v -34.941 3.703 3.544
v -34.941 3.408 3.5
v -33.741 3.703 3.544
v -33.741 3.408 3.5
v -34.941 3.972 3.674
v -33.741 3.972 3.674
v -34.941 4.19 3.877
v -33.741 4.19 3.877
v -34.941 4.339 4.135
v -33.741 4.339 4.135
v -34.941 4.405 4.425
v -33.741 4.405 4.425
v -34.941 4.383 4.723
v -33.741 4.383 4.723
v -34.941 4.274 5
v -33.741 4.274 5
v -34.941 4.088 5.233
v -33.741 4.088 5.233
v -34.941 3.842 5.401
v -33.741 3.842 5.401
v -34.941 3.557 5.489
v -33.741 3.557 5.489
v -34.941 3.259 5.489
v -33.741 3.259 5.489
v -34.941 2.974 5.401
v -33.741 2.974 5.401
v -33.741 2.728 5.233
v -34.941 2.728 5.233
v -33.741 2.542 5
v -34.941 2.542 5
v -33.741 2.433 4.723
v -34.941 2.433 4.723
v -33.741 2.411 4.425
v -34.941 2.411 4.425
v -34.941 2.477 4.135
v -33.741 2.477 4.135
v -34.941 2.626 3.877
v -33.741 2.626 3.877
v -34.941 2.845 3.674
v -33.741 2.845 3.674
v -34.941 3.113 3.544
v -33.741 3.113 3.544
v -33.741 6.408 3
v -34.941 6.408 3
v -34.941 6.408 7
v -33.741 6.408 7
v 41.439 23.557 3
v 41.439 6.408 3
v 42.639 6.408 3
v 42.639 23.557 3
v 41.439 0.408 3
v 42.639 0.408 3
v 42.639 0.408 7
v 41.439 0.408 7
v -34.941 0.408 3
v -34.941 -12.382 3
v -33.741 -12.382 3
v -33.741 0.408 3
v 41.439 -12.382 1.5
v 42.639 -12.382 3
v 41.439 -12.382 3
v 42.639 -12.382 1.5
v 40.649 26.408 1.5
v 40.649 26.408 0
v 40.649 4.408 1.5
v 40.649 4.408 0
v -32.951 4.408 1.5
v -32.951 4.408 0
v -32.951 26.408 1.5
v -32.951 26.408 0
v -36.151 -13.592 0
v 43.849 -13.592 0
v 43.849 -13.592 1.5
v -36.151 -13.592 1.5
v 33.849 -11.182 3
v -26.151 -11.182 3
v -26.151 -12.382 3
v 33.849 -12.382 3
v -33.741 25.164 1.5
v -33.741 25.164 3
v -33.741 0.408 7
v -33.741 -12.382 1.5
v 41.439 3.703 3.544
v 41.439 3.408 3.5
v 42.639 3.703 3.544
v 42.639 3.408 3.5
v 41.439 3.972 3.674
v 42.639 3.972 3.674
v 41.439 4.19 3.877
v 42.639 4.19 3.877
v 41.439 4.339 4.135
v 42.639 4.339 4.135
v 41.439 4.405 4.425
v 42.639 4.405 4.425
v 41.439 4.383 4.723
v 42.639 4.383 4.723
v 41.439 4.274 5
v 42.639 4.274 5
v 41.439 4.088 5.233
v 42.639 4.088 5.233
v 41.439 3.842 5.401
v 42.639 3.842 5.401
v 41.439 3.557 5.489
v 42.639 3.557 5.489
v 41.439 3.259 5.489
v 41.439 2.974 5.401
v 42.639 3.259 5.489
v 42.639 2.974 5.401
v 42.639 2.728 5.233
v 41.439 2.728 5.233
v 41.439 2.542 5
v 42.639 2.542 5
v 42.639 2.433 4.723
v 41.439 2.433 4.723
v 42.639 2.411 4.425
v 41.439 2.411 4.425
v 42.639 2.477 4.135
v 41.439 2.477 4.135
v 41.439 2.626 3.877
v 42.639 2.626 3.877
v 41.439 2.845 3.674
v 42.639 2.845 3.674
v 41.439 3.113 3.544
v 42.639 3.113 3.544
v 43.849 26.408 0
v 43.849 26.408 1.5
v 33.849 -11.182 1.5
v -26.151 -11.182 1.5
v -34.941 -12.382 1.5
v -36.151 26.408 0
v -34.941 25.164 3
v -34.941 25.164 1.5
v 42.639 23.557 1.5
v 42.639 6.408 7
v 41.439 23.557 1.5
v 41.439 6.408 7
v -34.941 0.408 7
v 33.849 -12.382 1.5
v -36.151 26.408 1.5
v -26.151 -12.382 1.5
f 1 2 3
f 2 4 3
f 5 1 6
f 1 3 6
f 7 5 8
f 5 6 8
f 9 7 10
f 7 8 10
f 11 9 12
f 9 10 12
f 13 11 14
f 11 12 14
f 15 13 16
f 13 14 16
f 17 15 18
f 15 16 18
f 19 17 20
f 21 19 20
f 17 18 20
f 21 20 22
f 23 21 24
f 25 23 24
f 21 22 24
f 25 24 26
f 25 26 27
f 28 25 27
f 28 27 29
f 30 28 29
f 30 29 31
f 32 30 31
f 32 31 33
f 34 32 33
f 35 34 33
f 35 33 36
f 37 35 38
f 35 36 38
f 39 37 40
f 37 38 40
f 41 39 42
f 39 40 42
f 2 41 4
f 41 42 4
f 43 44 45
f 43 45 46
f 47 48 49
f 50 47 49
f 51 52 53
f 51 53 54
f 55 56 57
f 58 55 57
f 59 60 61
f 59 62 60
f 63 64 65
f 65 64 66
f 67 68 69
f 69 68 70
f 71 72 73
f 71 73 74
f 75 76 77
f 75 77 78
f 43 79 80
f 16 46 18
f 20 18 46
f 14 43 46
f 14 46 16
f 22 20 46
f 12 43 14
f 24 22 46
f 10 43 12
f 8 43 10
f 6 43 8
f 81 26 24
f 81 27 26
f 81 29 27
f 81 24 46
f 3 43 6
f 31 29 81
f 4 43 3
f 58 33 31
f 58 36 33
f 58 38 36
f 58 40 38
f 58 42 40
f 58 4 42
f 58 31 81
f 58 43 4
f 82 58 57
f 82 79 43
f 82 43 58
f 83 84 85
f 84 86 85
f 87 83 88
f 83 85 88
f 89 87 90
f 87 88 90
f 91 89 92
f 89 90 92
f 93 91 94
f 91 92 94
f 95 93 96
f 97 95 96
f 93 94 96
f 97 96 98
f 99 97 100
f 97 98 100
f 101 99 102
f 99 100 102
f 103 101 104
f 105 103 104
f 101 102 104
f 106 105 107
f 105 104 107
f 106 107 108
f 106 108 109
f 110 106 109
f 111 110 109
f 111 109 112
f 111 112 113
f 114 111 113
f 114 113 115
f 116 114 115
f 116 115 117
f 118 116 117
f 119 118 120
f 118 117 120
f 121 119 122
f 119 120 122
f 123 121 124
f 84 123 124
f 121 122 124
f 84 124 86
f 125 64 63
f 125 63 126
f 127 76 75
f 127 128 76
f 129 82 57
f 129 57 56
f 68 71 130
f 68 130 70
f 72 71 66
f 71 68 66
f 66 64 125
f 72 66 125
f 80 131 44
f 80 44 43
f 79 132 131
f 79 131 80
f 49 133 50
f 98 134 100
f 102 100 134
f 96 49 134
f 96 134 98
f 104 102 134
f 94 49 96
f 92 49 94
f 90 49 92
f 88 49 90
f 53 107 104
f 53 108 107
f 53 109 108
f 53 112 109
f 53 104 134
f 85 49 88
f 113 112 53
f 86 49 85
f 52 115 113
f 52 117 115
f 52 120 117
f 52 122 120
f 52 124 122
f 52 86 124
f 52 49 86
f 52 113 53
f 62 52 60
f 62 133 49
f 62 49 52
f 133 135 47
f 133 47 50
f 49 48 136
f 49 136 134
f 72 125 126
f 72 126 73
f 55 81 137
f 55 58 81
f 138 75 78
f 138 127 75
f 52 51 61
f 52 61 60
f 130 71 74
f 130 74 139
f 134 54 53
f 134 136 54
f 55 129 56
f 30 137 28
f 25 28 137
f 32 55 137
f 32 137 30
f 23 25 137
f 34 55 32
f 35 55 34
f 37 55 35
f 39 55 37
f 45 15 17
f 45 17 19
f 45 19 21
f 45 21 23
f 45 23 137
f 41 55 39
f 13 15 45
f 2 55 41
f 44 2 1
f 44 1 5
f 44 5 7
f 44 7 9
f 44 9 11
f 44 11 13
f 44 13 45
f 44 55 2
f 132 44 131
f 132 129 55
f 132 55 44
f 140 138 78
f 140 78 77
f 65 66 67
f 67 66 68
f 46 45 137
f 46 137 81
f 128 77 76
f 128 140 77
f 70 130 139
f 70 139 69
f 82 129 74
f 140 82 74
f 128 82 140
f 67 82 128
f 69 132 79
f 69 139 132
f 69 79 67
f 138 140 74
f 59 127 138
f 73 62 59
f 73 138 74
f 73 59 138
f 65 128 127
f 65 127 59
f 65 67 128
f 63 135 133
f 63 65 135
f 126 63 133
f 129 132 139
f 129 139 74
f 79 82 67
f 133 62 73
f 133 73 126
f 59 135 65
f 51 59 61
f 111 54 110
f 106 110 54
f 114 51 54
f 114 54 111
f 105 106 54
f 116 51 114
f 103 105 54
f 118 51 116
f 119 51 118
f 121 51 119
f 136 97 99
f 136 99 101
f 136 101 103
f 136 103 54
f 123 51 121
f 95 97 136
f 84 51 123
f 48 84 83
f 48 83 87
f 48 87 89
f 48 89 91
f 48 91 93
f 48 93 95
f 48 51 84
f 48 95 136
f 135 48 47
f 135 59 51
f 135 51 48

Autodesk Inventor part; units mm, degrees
ref_plane "YZ Plane" through (0, 0, 0) normal (1, 0, 0) x (0, 1, 0)
ref_plane "XZ Plane" through (0, 0, 0) normal (0, 1, 0) x (-1, 0, 0)
ref_plane "XY Plane" through (0, 0, 0) normal (0, 0, 1) x (1, 0, 0)
sketch "Skizze1" plane through (0, 0, 0) normal (0, 0, 1) x (1, 0, 0)
  line L0 (-36.1506, 26.4082) -> (43.8494, 26.4082)
  line L1 (43.8494, 26.4082) -> (43.8494, -13.5918)
  line L2 (43.8494, -13.5918) -> (-36.1506, -13.5918)
  line L3 (-36.1506, -13.5918) -> (-36.1506, 26.4082)
  line L4 (-34.9406, 25.1642) -> (-33.7406, 25.1642)
  line L5 (-33.7406, 25.1642) -> (-33.7406, -12.3818)
  line L6 (-33.7406, -12.3818) -> (-34.9406, -12.3818)
  line L7 (-34.9406, -12.3818) -> (-34.9406, 25.1642)
  line L8 (41.4394, 23.5568) -> (42.6394, 23.5568)
  line L9 (42.6394, 23.5568) -> (42.6394, -12.3818)
  line L10 (42.6394, -12.3818) -> (41.4394, -12.3818)
  line L11 (41.4394, -12.3818) -> (41.4394, 23.5568)
  line L12 (-32.9506, 26.4082) -> (40.6494, 26.4082)
  line L13 (40.6494, 26.4082) -> (40.6494, 4.4082)
  line L14 (40.6494, 4.4082) -> (-32.9506, 4.4082)
  line L15 (-32.9506, 4.4082) -> (-32.9506, 26.4082)
  line L16 (-26.1506, -11.1818) -> (33.8494, -11.1818)
  line L17 (33.8494, -11.1818) -> (33.8494, -12.3818)
  line L18 (33.8494, -12.3818) -> (-26.1506, -12.3818)
  line L19 (-26.1506, -12.3818) -> (-26.1506, -11.1818)
  line L20 (42.6394, 0.4082) -> (41.4394, 0.4082)
  line L21 (41.4394, 0.4082) -> (41.4394, 6.4082)
  line L22 (41.4394, 6.4082) -> (42.6394, 6.4082)
  line L23 (42.6394, 6.4082) -> (42.6394, 0.4082)
  line L24 (-33.7406, 0.4082) -> (-34.9406, 0.4082)
  line L25 (-34.9406, 0.4082) -> (-34.9406, 6.4082)
  line L26 (-34.9406, 6.4082) -> (-33.7406, 6.4082)
  line L27 (-33.7406, 6.4082) -> (-33.7406, 0.4082)
  point P0 (0, 0)
  point P1 (-32.9506, 15.4082)
  point P2 (42.0394, -12.3818)
  point P3 (33.8494, -11.7818)
  point P4 (-26.1506, -11.7818)
  point P5 (42.0394, 0.4082)
  point P6 (42.0394, 6.4082)
  point P7 (-34.3406, 0.4082)
  point P8 (-34.3406, 6.4082)
  dimension "d0" = 80
  dimension "d1" = 40
  dimension "d2" = 1.21
  dimension "d3" = 1.21
  dimension "d4" = 35.9386
  dimension "d5" = 1.2
  dimension "d6" = 1.2
  dimension "d7" = 18
  dimension "d8" = 3.2
  dimension "d9" = 3.2
  dimension "d10" = 1.21
  dimension "d11" = 1.21
  dimension "d12" = 1.2
  dimension "d13" = 10
  dimension "d14" = 10
  dimension "d15" = 14
  dimension "d16" = 6
  dimension "d17" = 14
  dimension "d18" = 6
extrude "Extrusion1" add sketch "Skizze1" along normal blind 1.5 contours L0 L15 L14 L13 L1 L2 L3
extrude "Extrusion2" add sketch "Skizze1" along normal blind 3 contours L4 L5 L26 L7 | L24 L5 L6 L7 | L8 L9 L22 L11 | L20 L9 L10 L11 | L16 L17 L18 L19
extrude "Extrusion3" add sketch "Skizze1" along normal blind 7 contours L26 L5 L24 L7 | L22 L9 L20 L11
sketch "Skizze2" plane through (42.6394, -12.3818, 1.5) normal (1, 0, 0) x (0, 0, -1)
  circle A0 centre (-3, 15.79) radius 1
  line L0 (0, -1.21) -> (0, 38.79) projected
  line L1 (1.5, -1.21) -> (0, -1.21) projected
  point P0 (1.5, 12.3818)
  point P1 (0.75, -1.21)
  dimension "d25" = 2
  dimension "d26" = 3
  dimension "d27" = 17
extrude "Extrusion4" cut sketch "Skizze2" against normal through all
properties part number "Konsole_Deckel"
